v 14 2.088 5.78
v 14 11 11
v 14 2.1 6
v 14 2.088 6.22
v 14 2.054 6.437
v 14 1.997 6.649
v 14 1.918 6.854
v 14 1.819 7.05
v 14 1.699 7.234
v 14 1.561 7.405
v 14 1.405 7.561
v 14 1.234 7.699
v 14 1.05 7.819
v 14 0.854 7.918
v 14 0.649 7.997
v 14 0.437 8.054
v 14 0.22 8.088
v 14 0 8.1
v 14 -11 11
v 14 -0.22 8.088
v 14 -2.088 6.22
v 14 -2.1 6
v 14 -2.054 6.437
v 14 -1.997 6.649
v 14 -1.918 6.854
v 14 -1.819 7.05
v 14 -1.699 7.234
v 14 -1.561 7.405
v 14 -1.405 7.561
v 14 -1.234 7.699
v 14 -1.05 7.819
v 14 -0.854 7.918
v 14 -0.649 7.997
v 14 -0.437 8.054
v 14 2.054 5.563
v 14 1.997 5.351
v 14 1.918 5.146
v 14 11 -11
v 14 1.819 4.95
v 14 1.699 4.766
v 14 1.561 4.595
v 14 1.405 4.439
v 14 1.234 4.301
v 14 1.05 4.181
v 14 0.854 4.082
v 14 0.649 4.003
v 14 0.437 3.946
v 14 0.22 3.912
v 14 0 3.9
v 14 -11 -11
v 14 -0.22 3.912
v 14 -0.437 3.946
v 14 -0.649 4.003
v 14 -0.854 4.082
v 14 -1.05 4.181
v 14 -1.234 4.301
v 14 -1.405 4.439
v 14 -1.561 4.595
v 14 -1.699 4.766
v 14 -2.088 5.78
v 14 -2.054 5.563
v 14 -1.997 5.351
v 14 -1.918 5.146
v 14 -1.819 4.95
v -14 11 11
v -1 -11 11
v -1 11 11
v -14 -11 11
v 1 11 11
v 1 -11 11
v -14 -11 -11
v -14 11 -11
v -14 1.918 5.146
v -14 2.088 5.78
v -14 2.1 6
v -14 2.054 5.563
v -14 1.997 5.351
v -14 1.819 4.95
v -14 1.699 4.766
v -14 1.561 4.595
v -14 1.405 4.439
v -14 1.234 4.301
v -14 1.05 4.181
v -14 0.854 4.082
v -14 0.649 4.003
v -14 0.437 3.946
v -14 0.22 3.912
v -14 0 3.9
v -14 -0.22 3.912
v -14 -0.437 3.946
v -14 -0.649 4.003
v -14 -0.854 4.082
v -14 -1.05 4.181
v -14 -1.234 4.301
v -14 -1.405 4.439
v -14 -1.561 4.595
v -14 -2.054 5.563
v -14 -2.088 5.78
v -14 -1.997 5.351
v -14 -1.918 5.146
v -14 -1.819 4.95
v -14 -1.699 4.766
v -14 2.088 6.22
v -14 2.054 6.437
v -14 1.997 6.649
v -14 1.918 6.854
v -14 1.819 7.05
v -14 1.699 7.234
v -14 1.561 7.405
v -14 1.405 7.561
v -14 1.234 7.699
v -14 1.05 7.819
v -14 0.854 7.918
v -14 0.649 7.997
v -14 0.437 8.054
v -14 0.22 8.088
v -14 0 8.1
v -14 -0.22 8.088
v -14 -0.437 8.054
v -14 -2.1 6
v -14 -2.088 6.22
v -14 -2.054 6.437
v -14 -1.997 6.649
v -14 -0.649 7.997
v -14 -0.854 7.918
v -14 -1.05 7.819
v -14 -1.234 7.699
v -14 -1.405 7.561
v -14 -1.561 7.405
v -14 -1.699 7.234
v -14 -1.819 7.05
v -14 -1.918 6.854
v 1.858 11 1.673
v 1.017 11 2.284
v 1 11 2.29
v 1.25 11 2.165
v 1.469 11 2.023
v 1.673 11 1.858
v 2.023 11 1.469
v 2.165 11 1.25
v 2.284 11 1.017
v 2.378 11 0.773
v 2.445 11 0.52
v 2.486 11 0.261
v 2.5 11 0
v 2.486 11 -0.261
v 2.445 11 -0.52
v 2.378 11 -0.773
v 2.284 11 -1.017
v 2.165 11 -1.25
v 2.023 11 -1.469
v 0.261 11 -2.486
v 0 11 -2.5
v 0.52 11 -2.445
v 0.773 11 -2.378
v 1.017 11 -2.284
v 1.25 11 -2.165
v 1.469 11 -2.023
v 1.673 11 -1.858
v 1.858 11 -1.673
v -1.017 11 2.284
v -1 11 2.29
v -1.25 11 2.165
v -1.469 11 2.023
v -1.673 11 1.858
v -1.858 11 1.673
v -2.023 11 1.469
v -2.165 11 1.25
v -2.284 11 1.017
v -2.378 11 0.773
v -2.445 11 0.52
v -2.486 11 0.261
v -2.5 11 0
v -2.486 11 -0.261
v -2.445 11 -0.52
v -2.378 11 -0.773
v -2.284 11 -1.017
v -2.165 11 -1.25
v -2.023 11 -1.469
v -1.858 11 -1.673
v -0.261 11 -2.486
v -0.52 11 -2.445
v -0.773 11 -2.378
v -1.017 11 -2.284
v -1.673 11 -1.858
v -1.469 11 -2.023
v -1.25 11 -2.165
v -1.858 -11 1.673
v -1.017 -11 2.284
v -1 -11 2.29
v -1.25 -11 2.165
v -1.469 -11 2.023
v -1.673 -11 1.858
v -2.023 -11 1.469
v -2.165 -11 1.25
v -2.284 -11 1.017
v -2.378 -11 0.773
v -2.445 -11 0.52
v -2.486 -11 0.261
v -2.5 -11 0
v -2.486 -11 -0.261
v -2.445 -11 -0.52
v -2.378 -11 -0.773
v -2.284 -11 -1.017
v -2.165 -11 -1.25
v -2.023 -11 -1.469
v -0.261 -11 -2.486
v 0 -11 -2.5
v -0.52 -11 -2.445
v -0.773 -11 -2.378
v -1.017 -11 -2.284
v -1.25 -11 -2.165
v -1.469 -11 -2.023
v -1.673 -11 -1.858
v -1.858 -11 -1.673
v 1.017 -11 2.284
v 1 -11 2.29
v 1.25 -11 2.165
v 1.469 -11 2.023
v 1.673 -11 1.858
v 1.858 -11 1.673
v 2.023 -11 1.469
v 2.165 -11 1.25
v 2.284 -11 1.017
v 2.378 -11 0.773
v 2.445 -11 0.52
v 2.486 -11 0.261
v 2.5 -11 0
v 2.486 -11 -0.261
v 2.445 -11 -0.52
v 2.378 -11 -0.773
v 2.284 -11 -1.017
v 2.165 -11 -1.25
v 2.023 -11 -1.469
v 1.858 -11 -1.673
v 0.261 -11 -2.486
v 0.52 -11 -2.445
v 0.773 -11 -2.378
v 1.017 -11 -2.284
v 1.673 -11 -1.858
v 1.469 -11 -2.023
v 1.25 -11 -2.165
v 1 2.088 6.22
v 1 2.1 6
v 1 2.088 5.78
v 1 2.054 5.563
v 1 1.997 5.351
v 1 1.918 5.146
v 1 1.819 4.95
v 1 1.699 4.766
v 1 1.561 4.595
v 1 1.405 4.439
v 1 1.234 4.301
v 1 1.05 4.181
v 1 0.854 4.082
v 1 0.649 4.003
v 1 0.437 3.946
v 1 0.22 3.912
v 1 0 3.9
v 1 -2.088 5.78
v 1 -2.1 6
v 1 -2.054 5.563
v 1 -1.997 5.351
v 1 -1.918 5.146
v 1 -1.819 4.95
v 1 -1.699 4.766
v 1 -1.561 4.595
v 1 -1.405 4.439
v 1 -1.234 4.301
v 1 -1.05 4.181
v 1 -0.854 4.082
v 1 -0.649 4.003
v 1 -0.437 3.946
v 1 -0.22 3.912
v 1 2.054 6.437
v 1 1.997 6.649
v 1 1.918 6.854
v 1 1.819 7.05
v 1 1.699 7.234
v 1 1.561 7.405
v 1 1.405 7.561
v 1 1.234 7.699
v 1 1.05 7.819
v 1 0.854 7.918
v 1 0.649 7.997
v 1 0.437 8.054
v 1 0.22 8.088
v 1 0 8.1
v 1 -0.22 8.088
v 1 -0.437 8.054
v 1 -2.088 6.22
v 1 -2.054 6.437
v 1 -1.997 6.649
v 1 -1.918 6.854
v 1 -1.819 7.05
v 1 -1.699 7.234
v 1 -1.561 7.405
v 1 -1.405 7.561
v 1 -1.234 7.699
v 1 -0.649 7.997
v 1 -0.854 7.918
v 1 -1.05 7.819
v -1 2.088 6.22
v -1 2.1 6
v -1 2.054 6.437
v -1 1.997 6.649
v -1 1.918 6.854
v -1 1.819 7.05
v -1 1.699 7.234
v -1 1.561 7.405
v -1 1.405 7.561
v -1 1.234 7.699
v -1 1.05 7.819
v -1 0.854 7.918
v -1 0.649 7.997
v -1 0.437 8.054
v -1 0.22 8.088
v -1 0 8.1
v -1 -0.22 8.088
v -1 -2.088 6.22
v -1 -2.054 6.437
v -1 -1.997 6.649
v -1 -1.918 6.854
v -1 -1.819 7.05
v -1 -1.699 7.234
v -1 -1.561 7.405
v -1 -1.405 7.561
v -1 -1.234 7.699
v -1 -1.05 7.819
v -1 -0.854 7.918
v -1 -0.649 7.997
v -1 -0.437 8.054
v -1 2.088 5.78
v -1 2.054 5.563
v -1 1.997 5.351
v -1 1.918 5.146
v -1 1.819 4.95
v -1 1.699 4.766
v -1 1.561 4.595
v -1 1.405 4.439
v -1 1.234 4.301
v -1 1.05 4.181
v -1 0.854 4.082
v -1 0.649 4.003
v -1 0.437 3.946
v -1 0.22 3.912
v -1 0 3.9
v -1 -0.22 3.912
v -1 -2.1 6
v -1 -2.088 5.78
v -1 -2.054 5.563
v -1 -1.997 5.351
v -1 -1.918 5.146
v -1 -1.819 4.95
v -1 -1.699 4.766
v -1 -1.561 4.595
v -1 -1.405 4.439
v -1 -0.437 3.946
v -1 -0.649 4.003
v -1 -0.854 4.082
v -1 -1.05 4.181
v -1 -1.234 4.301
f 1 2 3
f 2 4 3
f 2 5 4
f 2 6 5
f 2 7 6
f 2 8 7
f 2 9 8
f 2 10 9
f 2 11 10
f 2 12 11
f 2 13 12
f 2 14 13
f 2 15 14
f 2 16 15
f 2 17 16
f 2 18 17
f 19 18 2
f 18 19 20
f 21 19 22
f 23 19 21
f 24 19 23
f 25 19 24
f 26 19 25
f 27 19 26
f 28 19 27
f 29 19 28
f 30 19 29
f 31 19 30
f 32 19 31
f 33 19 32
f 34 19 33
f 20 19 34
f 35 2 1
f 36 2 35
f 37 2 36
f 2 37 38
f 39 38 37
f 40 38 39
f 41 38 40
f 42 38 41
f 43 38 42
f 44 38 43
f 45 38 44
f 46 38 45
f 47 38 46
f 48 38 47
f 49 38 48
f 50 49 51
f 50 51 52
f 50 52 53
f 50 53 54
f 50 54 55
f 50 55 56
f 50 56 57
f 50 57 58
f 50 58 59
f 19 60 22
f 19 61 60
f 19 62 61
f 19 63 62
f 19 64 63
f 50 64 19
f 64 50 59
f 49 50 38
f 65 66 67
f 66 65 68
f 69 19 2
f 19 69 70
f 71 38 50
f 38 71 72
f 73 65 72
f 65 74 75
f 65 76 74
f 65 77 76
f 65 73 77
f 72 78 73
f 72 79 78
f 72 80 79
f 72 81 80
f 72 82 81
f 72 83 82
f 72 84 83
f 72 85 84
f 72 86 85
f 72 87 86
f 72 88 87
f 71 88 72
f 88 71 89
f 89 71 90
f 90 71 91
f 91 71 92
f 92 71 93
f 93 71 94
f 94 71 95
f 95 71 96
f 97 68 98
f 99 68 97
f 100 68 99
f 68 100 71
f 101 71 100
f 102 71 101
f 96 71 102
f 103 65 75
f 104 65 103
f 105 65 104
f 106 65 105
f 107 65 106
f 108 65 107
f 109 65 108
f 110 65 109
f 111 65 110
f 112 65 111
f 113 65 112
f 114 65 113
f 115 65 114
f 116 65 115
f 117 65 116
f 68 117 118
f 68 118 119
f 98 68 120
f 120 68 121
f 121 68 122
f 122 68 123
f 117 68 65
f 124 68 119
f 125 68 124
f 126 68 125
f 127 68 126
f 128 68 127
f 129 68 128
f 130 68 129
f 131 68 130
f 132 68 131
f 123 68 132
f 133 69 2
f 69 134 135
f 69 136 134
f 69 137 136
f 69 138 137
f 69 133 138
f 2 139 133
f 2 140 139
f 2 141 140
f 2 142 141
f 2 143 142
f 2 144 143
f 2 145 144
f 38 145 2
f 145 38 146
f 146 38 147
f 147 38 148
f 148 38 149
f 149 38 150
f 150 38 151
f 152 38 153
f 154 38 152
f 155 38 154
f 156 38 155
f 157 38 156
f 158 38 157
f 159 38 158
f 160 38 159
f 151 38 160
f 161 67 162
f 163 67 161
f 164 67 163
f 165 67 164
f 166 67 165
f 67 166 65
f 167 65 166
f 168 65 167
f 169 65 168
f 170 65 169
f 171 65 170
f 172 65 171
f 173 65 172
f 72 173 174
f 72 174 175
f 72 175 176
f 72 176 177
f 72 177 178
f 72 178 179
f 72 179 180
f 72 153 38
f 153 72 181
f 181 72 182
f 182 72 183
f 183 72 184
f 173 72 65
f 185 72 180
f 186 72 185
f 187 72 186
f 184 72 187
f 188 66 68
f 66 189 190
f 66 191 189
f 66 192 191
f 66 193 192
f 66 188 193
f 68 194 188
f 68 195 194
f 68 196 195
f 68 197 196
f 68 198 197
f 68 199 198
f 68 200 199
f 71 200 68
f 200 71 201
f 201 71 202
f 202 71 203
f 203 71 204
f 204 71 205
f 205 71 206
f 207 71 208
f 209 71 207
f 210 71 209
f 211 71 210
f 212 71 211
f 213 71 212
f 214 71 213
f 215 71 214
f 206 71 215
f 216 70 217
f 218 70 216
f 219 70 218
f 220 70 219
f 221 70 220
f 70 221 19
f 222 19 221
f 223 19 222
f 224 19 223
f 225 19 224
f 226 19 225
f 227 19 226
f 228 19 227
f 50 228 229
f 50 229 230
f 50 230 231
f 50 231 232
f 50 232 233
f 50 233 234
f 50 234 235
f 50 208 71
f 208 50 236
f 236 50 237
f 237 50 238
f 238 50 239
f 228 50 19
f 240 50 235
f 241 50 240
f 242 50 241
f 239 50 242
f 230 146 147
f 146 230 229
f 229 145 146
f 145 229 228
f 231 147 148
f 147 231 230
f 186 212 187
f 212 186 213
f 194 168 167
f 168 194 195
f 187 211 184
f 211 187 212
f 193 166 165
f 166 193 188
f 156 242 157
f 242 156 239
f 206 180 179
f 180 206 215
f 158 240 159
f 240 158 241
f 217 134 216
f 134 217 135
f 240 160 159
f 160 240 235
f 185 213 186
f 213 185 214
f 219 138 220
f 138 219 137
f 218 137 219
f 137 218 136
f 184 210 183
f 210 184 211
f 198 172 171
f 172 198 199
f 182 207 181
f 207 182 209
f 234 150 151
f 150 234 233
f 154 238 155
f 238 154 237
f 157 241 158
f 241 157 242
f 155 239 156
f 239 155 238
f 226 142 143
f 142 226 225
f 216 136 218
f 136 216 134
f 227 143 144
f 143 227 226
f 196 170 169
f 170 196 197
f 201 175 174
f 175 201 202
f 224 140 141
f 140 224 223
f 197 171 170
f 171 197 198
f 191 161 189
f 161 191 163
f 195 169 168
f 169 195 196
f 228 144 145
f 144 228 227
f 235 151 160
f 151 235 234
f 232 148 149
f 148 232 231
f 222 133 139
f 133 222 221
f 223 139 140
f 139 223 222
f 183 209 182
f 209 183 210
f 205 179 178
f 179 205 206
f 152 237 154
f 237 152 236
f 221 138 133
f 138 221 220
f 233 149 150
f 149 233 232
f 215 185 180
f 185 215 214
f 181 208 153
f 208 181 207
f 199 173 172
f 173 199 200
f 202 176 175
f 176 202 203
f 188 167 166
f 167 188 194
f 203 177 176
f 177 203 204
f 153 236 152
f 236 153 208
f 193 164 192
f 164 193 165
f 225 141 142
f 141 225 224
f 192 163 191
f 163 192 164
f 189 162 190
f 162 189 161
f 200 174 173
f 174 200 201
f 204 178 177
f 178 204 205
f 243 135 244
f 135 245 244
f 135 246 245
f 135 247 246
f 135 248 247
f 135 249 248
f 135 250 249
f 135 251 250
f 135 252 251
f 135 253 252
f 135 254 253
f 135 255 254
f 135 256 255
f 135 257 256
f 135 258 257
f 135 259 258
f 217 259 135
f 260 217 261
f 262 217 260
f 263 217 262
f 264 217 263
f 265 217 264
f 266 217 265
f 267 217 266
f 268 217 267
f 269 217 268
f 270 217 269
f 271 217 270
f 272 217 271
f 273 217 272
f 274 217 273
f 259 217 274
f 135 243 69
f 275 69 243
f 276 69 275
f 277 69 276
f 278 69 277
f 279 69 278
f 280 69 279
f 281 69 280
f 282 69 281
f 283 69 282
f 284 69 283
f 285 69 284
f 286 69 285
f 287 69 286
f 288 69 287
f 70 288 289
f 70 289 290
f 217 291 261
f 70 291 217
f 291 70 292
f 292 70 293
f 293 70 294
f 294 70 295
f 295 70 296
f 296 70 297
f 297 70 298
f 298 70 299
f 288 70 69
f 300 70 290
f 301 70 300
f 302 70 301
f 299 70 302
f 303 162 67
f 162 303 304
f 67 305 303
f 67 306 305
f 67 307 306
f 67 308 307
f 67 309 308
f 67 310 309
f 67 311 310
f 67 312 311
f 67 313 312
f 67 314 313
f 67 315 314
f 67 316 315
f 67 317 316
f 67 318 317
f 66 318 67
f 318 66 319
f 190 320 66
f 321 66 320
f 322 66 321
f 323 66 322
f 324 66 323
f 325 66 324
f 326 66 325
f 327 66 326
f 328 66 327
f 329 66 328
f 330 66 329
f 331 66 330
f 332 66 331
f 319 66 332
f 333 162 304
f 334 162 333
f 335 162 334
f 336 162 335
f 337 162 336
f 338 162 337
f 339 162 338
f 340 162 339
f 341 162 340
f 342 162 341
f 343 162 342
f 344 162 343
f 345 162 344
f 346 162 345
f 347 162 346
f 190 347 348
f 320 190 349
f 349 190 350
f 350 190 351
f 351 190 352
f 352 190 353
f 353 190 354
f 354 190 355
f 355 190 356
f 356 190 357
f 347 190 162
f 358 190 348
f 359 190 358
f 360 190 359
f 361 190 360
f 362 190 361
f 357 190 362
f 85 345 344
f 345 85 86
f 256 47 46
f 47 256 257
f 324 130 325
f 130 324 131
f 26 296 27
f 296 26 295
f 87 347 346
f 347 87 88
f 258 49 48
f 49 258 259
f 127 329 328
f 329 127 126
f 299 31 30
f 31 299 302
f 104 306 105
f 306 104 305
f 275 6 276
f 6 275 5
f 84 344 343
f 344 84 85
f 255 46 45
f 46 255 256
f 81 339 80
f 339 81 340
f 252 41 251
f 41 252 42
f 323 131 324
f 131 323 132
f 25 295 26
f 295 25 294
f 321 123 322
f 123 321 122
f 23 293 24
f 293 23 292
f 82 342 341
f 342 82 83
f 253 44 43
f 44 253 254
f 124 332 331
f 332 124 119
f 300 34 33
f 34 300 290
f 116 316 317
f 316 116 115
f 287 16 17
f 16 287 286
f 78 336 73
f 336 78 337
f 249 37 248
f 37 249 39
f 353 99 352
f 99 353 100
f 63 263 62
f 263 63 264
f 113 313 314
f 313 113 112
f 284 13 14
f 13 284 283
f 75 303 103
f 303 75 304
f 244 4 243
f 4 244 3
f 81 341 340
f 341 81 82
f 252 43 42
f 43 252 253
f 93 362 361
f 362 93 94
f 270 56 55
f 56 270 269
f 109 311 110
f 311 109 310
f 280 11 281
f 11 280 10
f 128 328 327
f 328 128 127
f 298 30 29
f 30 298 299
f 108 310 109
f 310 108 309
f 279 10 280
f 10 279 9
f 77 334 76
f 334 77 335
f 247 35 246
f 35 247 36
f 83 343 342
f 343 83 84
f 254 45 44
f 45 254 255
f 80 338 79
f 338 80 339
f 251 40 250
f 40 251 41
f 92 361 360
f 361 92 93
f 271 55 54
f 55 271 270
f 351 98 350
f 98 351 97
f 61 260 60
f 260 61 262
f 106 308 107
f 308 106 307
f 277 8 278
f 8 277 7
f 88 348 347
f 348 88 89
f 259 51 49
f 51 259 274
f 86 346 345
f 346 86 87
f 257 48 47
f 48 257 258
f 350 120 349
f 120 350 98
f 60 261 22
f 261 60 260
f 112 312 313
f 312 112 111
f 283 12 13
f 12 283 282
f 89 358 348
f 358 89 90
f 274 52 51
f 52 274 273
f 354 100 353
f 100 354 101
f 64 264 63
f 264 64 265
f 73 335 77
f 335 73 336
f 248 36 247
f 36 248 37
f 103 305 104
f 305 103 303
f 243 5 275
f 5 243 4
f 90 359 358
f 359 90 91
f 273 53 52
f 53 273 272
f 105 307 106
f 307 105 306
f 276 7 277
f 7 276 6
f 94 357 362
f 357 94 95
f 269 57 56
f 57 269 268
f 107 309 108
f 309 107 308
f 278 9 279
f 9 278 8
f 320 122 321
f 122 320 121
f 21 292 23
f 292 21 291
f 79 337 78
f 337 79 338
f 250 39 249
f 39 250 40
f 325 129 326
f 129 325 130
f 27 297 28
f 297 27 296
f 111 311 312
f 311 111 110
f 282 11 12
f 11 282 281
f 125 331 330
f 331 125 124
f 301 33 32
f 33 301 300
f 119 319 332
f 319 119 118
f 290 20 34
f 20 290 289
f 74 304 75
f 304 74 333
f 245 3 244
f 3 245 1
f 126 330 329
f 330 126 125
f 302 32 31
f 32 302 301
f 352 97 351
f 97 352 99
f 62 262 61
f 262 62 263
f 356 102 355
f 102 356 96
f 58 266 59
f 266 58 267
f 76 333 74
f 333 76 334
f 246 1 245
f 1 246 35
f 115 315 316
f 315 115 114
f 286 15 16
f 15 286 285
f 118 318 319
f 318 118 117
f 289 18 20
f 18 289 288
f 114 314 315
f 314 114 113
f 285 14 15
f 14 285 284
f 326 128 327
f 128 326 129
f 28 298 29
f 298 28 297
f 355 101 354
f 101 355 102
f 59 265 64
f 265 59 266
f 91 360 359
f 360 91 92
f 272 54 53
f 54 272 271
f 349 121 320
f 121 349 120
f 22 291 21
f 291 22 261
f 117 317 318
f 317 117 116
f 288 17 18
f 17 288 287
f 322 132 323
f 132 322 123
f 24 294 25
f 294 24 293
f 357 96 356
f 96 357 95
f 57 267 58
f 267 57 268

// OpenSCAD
// Split clamp block.
$fn = 60;
eps = 0.02;
bore_d = 5;
body_w = 22;
body_h = 22;
body_l = 28;
slot_w = 2;
difference() {
    cube([body_l, body_w, body_h], center = true);
    translate([0, -body_w / 2 - eps, 0]) rotate([-90,0,0]) cylinder(d = bore_d, h = body_w + 2 * eps);
    translate([-slot_w / 2, -body_w / 2 - eps, 0]) cube([slot_w, body_w + 2 * eps, body_h / 2 + eps]);
    translate([-body_l / 2 - eps, 0, body_h / 2 - 5]) rotate([0,90,0]) cylinder(d = 4.2, h = body_l + 2 * eps);
}
